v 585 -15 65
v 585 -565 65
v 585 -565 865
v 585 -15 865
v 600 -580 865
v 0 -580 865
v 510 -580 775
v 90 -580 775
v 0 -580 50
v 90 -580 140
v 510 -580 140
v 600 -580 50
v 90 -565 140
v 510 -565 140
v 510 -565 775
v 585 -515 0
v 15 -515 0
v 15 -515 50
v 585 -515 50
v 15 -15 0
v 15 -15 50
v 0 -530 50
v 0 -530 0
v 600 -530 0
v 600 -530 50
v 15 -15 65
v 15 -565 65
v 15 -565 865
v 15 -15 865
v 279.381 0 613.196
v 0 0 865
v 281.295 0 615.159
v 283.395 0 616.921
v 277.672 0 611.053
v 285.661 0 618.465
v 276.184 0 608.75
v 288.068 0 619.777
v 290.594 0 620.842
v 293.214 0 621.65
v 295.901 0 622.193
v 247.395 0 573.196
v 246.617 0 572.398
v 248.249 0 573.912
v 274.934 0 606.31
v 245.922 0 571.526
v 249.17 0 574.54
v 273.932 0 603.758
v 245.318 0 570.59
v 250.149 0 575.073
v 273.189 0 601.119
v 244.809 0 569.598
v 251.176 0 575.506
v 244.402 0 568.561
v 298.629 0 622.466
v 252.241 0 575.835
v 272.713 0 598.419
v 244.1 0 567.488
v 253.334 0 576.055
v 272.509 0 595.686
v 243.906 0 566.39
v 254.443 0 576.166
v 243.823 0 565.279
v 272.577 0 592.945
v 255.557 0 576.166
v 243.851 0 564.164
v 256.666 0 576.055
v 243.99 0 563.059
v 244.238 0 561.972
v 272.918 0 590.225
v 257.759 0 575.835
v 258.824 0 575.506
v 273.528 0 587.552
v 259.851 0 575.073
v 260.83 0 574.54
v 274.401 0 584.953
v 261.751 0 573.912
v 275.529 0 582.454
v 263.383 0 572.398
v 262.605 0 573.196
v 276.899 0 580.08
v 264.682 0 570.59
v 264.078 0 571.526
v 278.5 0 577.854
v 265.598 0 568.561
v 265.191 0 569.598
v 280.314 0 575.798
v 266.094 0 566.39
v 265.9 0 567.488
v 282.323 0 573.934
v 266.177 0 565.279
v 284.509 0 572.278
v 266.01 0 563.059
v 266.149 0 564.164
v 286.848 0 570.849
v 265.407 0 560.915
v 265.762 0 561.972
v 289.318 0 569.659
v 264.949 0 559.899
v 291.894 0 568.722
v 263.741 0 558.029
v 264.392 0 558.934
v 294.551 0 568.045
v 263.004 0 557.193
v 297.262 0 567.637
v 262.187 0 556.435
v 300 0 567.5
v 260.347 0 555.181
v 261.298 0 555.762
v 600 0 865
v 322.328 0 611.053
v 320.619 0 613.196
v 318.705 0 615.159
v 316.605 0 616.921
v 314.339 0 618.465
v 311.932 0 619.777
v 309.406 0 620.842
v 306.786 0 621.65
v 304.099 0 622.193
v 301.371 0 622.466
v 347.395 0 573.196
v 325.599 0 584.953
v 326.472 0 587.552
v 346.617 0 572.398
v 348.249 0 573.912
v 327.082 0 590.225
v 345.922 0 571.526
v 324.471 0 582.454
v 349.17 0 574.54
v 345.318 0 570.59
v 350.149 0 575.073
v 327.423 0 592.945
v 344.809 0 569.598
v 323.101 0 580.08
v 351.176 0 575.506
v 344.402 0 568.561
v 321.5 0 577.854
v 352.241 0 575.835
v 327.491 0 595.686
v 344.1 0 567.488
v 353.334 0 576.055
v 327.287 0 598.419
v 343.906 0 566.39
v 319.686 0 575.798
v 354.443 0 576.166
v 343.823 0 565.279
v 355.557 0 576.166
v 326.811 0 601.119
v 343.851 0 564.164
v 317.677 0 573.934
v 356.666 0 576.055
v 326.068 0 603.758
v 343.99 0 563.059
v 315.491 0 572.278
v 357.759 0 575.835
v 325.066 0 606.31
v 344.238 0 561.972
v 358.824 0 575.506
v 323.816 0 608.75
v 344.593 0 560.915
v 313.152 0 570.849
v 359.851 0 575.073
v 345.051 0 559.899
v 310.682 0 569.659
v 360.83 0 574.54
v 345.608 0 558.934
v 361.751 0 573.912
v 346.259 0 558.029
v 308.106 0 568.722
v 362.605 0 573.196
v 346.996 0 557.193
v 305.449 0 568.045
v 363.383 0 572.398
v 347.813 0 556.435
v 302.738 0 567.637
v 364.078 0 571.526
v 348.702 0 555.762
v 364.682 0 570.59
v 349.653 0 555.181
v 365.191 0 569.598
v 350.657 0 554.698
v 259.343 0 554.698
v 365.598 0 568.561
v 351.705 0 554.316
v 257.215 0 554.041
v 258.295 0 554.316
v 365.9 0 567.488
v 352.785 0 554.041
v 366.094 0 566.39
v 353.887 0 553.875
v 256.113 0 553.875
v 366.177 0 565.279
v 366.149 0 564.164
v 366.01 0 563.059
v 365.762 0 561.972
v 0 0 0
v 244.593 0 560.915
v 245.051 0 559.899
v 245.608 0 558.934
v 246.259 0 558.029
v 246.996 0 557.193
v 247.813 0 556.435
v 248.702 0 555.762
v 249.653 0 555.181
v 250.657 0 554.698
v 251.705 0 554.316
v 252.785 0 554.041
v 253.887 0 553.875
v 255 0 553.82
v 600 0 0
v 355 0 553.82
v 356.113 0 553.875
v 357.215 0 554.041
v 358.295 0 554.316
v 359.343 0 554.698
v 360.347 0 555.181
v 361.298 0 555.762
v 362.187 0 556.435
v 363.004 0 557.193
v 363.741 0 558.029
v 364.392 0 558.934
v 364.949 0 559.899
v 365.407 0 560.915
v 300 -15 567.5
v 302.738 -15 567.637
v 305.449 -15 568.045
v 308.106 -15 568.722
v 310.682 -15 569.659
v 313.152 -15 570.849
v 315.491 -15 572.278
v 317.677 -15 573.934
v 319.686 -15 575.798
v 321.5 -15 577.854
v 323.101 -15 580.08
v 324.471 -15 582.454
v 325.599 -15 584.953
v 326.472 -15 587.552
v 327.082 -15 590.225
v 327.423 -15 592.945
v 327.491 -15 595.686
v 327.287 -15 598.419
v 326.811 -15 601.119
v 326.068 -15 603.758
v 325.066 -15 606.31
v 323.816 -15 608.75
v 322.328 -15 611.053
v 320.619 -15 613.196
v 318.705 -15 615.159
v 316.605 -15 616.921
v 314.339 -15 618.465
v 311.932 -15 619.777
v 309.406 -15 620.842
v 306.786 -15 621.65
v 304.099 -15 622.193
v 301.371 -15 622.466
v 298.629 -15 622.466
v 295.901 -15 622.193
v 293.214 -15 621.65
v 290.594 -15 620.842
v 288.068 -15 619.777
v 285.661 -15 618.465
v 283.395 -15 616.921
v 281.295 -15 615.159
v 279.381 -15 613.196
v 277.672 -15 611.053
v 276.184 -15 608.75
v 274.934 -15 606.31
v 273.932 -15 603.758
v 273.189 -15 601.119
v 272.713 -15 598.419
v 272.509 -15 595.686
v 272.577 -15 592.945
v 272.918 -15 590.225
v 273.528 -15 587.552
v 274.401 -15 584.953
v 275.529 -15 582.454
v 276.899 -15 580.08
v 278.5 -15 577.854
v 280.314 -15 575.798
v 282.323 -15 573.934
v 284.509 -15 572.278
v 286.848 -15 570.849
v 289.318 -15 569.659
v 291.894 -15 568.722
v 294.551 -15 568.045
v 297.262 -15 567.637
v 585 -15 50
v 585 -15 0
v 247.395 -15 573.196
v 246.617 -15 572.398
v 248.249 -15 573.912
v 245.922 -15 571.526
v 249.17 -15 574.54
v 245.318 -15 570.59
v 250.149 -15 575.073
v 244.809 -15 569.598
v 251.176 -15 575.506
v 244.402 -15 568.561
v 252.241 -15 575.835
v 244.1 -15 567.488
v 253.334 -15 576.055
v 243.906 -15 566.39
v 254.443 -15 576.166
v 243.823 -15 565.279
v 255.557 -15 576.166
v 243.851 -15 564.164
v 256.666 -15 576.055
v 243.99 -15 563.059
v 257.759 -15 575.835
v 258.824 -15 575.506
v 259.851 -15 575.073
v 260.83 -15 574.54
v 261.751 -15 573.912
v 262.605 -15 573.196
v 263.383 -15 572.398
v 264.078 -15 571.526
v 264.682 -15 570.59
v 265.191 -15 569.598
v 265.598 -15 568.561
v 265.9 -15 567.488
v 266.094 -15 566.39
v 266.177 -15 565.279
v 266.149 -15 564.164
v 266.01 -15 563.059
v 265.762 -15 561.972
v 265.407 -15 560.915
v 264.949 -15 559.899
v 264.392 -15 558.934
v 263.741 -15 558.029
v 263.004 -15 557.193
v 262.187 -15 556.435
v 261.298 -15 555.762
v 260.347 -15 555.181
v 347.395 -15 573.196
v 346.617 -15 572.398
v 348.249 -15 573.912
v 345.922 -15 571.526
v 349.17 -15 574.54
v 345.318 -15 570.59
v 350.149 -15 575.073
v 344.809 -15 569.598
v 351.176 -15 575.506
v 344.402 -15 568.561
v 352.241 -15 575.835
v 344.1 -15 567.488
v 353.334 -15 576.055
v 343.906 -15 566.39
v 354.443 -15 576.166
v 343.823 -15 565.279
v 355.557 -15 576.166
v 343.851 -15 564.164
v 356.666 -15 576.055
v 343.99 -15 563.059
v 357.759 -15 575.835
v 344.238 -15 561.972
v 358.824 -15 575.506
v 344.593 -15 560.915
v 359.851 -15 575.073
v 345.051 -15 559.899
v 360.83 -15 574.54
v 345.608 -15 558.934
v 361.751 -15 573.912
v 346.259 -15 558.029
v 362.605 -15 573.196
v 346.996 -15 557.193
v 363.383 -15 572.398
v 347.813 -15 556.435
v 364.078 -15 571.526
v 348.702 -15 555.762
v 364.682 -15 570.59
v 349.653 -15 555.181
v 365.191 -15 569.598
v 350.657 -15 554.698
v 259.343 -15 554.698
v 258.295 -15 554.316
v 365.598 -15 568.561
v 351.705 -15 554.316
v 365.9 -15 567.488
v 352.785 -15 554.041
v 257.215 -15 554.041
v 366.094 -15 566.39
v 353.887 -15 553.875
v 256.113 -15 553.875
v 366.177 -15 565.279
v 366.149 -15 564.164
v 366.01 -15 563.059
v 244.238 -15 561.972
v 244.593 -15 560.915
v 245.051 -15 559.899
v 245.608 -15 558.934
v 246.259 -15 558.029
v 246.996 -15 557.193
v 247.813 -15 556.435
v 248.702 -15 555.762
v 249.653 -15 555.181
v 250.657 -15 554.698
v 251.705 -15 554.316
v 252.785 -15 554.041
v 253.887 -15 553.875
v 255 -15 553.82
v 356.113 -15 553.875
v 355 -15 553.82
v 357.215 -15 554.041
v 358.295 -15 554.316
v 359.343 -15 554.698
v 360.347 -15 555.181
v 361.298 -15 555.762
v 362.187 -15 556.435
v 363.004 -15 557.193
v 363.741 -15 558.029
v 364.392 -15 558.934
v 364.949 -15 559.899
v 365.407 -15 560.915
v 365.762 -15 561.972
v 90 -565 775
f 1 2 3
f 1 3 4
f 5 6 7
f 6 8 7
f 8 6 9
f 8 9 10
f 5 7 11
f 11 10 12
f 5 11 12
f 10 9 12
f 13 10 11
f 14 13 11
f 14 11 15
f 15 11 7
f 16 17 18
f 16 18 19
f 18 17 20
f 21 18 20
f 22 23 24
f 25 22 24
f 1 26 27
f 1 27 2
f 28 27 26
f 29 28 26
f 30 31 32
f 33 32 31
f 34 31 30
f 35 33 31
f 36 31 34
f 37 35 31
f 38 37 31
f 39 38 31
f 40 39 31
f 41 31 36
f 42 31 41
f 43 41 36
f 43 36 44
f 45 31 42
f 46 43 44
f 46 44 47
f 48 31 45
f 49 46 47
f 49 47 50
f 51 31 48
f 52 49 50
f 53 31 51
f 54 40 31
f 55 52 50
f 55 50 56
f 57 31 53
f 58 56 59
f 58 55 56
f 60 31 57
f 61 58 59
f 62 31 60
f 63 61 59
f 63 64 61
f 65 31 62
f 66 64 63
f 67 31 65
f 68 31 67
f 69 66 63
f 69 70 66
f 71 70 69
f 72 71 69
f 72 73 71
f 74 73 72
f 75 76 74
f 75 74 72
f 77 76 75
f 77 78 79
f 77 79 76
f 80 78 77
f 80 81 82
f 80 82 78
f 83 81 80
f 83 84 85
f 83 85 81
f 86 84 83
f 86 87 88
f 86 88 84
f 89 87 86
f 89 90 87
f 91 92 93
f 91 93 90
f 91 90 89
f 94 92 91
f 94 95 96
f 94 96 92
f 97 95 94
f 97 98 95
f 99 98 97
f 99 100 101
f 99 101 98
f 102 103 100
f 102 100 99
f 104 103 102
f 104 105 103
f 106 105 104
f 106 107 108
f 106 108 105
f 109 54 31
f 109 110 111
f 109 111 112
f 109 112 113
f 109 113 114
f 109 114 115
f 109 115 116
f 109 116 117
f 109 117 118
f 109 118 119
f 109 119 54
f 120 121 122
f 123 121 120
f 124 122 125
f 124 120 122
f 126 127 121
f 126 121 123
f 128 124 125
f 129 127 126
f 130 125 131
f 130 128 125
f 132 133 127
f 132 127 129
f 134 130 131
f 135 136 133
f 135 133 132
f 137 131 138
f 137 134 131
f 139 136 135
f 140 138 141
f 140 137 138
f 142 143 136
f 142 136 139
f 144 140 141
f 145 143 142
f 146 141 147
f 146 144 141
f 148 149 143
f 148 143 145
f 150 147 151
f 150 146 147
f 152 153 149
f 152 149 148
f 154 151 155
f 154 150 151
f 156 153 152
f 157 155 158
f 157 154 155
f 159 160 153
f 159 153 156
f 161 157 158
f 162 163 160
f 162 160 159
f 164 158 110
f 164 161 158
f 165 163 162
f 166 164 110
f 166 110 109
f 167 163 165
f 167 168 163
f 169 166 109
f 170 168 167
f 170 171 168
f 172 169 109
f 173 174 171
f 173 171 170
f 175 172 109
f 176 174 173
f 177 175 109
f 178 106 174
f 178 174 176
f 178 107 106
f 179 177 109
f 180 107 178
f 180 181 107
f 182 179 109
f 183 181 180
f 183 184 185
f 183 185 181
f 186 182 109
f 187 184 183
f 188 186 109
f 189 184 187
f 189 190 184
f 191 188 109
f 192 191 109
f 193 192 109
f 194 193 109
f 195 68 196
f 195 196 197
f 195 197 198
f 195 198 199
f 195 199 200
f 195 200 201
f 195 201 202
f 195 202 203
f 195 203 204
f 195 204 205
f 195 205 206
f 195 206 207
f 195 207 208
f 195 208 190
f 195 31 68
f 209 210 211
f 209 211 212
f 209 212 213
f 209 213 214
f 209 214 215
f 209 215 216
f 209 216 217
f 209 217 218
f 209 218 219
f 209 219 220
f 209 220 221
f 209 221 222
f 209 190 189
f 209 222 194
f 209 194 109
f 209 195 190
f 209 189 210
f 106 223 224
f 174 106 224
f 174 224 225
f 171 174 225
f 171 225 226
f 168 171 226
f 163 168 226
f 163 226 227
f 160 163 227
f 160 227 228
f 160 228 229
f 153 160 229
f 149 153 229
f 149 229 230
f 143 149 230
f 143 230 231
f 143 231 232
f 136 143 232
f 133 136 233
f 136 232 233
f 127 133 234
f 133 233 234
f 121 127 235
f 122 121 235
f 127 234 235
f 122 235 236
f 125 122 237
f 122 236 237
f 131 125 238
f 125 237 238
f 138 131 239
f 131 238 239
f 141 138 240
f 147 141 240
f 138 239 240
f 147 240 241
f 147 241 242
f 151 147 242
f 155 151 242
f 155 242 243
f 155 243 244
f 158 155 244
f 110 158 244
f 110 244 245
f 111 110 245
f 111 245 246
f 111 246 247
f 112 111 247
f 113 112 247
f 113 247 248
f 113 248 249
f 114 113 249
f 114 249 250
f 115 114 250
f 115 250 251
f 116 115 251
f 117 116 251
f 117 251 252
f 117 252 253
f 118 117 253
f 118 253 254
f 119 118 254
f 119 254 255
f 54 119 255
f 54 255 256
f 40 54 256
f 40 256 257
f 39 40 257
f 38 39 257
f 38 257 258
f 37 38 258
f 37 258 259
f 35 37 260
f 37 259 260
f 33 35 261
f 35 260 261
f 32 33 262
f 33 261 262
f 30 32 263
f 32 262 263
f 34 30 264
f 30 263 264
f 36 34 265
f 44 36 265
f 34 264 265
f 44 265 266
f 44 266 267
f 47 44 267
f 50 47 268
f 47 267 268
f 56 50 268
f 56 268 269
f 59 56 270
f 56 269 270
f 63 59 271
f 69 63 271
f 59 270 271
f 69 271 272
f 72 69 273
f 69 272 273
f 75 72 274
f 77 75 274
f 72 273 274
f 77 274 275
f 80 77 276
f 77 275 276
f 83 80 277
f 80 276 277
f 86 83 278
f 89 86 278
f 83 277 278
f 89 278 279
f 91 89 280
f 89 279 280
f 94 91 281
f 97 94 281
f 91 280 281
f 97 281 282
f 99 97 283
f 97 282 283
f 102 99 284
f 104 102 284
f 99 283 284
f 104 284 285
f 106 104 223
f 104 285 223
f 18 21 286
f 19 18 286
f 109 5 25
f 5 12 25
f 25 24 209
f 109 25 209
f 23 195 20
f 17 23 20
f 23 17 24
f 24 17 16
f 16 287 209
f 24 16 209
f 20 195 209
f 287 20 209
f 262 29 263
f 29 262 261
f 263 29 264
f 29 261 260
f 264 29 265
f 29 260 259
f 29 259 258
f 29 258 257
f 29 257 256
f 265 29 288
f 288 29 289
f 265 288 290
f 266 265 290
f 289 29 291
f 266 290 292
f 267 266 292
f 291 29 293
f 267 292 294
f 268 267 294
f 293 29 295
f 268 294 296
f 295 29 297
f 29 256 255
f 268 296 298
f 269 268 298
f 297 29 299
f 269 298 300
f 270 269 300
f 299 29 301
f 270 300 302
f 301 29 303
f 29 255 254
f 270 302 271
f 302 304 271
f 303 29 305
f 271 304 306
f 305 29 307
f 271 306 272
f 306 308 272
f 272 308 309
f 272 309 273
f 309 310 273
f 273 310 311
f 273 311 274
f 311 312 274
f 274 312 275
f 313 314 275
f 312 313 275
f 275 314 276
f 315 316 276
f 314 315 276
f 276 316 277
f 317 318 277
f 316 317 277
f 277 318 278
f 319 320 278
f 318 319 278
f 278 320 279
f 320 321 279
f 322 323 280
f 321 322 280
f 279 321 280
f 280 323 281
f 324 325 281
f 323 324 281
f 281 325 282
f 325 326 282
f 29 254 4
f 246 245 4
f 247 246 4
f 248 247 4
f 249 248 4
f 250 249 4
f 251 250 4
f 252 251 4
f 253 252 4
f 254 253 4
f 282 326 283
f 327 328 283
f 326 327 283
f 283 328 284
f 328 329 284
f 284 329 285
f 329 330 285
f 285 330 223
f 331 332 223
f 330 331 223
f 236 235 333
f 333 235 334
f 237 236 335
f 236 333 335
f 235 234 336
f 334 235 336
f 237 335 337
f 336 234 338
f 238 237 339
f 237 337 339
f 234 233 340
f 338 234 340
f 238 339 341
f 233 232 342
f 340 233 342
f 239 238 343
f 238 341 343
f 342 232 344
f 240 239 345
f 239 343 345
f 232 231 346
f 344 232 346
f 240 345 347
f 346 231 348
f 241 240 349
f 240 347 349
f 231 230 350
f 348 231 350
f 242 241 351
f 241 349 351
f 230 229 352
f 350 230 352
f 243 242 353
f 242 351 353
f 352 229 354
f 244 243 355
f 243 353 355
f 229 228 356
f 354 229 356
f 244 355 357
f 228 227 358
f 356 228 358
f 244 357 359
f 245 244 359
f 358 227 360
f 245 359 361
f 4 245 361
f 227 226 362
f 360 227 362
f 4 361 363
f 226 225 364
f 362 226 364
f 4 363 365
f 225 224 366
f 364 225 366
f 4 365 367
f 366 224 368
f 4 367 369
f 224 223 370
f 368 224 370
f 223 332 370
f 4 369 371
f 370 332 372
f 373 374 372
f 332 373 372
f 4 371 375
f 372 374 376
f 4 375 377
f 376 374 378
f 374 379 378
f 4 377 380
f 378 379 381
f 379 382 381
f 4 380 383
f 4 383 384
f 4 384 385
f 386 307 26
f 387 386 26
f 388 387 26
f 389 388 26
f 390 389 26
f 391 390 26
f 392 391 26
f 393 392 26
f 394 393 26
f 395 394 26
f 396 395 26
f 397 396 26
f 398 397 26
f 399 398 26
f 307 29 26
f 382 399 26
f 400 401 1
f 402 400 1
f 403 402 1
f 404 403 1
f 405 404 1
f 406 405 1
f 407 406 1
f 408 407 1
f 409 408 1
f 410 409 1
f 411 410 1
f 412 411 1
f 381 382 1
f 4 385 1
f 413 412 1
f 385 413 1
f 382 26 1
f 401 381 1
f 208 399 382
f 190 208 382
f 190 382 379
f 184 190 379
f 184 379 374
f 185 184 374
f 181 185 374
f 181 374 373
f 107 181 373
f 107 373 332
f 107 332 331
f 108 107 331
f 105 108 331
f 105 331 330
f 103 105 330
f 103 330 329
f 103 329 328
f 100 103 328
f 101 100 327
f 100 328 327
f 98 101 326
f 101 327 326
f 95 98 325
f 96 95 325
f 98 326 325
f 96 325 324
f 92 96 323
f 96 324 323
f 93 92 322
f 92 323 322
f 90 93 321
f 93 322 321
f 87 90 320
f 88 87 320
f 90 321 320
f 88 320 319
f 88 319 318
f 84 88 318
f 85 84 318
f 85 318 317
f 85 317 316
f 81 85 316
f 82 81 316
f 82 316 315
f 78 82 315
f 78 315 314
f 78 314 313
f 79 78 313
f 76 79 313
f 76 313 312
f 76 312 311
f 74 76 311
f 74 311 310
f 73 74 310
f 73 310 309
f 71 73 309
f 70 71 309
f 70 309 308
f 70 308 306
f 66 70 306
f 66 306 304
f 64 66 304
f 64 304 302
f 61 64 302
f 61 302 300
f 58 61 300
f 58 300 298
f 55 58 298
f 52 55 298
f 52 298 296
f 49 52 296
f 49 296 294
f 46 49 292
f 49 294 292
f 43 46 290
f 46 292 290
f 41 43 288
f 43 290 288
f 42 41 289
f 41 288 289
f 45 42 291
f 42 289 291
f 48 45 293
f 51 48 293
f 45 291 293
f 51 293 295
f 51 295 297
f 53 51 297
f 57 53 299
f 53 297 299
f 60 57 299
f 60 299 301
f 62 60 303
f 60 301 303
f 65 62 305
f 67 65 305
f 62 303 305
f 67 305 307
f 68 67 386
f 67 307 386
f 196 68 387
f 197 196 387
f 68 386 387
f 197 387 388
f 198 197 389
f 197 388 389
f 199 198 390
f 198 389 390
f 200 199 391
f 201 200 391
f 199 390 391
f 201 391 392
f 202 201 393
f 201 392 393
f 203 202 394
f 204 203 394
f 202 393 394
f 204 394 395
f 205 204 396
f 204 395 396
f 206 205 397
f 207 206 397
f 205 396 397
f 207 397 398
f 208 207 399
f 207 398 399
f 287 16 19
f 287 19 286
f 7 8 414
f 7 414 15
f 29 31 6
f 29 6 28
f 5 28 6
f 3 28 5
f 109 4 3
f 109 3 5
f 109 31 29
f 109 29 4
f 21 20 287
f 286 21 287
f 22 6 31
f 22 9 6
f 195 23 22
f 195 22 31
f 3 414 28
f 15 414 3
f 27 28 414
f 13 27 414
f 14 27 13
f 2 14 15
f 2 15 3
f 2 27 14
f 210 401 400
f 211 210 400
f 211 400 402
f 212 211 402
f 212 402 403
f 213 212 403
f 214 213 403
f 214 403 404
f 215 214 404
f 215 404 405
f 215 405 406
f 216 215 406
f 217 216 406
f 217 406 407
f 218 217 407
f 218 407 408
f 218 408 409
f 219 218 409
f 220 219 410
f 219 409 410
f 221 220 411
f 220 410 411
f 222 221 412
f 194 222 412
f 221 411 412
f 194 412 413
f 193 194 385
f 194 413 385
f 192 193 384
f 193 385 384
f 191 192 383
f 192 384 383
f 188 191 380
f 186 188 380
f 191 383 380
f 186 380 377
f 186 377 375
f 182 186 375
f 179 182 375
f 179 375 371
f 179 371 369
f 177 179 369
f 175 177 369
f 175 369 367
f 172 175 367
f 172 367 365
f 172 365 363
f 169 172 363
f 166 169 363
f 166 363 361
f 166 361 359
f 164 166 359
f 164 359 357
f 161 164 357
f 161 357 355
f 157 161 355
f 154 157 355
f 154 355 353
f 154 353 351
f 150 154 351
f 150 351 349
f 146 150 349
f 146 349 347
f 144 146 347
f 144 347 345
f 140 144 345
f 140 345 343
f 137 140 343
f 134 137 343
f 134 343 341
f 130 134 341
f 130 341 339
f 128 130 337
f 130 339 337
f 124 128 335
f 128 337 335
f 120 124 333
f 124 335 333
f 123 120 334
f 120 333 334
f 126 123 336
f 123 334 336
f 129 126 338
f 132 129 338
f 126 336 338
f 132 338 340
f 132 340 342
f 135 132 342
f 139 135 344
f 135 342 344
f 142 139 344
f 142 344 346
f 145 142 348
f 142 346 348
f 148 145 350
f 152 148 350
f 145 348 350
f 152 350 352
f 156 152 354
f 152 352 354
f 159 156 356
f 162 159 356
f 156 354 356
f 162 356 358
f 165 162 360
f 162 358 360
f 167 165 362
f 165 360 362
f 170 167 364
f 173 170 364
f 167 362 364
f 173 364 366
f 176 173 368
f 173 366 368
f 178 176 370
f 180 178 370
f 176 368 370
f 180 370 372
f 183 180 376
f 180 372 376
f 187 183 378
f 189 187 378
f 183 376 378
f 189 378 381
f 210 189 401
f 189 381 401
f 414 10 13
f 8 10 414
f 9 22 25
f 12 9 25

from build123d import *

# Parameters (mm, degrees)
SKETCH2_W           = 600
SKETCH2_H           = 530
SKETCH2_W_2         = 570
SKETCH2_H_2         = 500
BASE_EXTRUDE_DEPTH  = 50
SKETCH3_W           = 600
SKETCH3_H           = 580
BOSS_EXTRUDE2_DEPTH = 15
SKETCH4_W           = 600
SKETCH4_H           = 580
SKETCH4_W_2         = 570
SKETCH4_H_2         = 550
BOSS_EXTRUDE3_DEPTH = 800
CUT_EXTRUDE1_REACH  = 1203.926
SKETCH5_W           = 420
SKETCH5_H           = 635
SKETCH6_R           = 11.180339887
SKETCH6_R_2         = 27.5
CUT_EXTRUDE2_DEPTH  = 1195.759390003


with BuildPart() as part:
    # Sketch2 → Base-Extrude (new body)
    with BuildSketch(Plane.XY):
        with Locations((300, -265)):
            Rectangle(SKETCH2_W, SKETCH2_H)
        with Locations((300, -265)):
            Rectangle(SKETCH2_W_2, SKETCH2_H_2, mode=Mode.SUBTRACT)
    extrude(amount=BASE_EXTRUDE_DEPTH)

    # Sketch3 → Boss-Extrude2 (add)
    with BuildSketch(Plane.XY.offset(50)):
        with Locations((300, -290)):
            Rectangle(SKETCH3_W, SKETCH3_H)
    extrude(amount=BOSS_EXTRUDE2_DEPTH)

    # Sketch4 → Boss-Extrude3 (add)
    with BuildSketch(Plane.XY.offset(65)):
        with Locations((300, -290)):
            Rectangle(SKETCH4_W, SKETCH4_H)
        with Locations((300, -290)):
            Rectangle(SKETCH4_W_2, SKETCH4_H_2, mode=Mode.SUBTRACT)
    extrude(amount=BOSS_EXTRUDE3_DEPTH)

    # Sketch5 → Cut-Extrude1 (cut, up to next)
    with BuildSketch(Plane.XZ.offset(580), mode=Mode.PRIVATE) as cut_extrude1_sk1:
        with Locations((300, 457.5)):
            Rectangle(SKETCH5_W, SKETCH5_H)
    cut_extrude1_tool1 = extrude(cut_extrude1_sk1.sketch, amount=-CUT_EXTRUDE1_REACH, mode=Mode.PRIVATE) & part.part
    add(cut_extrude1_tool1.solids().sort_by_distance((300, -580, 457.5))[0], mode=Mode.SUBTRACT)

    # Sketch6 → Cut-Extrude2 (cut, through all)
    with BuildSketch(Plane.XZ.offset(15)):
        with Locations(Location((355, 565, 0), (0, 0, 270))):
            Circle(SKETCH6_R)
        with Locations(Location((255, 565, 0), (0, 0, 270))):
            Circle(SKETCH6_R)
        with Locations(Location((300, 595, 0), (0, 0, 270))):
            Circle(SKETCH6_R_2)
    extrude(amount=-CUT_EXTRUDE2_DEPTH, mode=Mode.SUBTRACT)


solid = part.part
